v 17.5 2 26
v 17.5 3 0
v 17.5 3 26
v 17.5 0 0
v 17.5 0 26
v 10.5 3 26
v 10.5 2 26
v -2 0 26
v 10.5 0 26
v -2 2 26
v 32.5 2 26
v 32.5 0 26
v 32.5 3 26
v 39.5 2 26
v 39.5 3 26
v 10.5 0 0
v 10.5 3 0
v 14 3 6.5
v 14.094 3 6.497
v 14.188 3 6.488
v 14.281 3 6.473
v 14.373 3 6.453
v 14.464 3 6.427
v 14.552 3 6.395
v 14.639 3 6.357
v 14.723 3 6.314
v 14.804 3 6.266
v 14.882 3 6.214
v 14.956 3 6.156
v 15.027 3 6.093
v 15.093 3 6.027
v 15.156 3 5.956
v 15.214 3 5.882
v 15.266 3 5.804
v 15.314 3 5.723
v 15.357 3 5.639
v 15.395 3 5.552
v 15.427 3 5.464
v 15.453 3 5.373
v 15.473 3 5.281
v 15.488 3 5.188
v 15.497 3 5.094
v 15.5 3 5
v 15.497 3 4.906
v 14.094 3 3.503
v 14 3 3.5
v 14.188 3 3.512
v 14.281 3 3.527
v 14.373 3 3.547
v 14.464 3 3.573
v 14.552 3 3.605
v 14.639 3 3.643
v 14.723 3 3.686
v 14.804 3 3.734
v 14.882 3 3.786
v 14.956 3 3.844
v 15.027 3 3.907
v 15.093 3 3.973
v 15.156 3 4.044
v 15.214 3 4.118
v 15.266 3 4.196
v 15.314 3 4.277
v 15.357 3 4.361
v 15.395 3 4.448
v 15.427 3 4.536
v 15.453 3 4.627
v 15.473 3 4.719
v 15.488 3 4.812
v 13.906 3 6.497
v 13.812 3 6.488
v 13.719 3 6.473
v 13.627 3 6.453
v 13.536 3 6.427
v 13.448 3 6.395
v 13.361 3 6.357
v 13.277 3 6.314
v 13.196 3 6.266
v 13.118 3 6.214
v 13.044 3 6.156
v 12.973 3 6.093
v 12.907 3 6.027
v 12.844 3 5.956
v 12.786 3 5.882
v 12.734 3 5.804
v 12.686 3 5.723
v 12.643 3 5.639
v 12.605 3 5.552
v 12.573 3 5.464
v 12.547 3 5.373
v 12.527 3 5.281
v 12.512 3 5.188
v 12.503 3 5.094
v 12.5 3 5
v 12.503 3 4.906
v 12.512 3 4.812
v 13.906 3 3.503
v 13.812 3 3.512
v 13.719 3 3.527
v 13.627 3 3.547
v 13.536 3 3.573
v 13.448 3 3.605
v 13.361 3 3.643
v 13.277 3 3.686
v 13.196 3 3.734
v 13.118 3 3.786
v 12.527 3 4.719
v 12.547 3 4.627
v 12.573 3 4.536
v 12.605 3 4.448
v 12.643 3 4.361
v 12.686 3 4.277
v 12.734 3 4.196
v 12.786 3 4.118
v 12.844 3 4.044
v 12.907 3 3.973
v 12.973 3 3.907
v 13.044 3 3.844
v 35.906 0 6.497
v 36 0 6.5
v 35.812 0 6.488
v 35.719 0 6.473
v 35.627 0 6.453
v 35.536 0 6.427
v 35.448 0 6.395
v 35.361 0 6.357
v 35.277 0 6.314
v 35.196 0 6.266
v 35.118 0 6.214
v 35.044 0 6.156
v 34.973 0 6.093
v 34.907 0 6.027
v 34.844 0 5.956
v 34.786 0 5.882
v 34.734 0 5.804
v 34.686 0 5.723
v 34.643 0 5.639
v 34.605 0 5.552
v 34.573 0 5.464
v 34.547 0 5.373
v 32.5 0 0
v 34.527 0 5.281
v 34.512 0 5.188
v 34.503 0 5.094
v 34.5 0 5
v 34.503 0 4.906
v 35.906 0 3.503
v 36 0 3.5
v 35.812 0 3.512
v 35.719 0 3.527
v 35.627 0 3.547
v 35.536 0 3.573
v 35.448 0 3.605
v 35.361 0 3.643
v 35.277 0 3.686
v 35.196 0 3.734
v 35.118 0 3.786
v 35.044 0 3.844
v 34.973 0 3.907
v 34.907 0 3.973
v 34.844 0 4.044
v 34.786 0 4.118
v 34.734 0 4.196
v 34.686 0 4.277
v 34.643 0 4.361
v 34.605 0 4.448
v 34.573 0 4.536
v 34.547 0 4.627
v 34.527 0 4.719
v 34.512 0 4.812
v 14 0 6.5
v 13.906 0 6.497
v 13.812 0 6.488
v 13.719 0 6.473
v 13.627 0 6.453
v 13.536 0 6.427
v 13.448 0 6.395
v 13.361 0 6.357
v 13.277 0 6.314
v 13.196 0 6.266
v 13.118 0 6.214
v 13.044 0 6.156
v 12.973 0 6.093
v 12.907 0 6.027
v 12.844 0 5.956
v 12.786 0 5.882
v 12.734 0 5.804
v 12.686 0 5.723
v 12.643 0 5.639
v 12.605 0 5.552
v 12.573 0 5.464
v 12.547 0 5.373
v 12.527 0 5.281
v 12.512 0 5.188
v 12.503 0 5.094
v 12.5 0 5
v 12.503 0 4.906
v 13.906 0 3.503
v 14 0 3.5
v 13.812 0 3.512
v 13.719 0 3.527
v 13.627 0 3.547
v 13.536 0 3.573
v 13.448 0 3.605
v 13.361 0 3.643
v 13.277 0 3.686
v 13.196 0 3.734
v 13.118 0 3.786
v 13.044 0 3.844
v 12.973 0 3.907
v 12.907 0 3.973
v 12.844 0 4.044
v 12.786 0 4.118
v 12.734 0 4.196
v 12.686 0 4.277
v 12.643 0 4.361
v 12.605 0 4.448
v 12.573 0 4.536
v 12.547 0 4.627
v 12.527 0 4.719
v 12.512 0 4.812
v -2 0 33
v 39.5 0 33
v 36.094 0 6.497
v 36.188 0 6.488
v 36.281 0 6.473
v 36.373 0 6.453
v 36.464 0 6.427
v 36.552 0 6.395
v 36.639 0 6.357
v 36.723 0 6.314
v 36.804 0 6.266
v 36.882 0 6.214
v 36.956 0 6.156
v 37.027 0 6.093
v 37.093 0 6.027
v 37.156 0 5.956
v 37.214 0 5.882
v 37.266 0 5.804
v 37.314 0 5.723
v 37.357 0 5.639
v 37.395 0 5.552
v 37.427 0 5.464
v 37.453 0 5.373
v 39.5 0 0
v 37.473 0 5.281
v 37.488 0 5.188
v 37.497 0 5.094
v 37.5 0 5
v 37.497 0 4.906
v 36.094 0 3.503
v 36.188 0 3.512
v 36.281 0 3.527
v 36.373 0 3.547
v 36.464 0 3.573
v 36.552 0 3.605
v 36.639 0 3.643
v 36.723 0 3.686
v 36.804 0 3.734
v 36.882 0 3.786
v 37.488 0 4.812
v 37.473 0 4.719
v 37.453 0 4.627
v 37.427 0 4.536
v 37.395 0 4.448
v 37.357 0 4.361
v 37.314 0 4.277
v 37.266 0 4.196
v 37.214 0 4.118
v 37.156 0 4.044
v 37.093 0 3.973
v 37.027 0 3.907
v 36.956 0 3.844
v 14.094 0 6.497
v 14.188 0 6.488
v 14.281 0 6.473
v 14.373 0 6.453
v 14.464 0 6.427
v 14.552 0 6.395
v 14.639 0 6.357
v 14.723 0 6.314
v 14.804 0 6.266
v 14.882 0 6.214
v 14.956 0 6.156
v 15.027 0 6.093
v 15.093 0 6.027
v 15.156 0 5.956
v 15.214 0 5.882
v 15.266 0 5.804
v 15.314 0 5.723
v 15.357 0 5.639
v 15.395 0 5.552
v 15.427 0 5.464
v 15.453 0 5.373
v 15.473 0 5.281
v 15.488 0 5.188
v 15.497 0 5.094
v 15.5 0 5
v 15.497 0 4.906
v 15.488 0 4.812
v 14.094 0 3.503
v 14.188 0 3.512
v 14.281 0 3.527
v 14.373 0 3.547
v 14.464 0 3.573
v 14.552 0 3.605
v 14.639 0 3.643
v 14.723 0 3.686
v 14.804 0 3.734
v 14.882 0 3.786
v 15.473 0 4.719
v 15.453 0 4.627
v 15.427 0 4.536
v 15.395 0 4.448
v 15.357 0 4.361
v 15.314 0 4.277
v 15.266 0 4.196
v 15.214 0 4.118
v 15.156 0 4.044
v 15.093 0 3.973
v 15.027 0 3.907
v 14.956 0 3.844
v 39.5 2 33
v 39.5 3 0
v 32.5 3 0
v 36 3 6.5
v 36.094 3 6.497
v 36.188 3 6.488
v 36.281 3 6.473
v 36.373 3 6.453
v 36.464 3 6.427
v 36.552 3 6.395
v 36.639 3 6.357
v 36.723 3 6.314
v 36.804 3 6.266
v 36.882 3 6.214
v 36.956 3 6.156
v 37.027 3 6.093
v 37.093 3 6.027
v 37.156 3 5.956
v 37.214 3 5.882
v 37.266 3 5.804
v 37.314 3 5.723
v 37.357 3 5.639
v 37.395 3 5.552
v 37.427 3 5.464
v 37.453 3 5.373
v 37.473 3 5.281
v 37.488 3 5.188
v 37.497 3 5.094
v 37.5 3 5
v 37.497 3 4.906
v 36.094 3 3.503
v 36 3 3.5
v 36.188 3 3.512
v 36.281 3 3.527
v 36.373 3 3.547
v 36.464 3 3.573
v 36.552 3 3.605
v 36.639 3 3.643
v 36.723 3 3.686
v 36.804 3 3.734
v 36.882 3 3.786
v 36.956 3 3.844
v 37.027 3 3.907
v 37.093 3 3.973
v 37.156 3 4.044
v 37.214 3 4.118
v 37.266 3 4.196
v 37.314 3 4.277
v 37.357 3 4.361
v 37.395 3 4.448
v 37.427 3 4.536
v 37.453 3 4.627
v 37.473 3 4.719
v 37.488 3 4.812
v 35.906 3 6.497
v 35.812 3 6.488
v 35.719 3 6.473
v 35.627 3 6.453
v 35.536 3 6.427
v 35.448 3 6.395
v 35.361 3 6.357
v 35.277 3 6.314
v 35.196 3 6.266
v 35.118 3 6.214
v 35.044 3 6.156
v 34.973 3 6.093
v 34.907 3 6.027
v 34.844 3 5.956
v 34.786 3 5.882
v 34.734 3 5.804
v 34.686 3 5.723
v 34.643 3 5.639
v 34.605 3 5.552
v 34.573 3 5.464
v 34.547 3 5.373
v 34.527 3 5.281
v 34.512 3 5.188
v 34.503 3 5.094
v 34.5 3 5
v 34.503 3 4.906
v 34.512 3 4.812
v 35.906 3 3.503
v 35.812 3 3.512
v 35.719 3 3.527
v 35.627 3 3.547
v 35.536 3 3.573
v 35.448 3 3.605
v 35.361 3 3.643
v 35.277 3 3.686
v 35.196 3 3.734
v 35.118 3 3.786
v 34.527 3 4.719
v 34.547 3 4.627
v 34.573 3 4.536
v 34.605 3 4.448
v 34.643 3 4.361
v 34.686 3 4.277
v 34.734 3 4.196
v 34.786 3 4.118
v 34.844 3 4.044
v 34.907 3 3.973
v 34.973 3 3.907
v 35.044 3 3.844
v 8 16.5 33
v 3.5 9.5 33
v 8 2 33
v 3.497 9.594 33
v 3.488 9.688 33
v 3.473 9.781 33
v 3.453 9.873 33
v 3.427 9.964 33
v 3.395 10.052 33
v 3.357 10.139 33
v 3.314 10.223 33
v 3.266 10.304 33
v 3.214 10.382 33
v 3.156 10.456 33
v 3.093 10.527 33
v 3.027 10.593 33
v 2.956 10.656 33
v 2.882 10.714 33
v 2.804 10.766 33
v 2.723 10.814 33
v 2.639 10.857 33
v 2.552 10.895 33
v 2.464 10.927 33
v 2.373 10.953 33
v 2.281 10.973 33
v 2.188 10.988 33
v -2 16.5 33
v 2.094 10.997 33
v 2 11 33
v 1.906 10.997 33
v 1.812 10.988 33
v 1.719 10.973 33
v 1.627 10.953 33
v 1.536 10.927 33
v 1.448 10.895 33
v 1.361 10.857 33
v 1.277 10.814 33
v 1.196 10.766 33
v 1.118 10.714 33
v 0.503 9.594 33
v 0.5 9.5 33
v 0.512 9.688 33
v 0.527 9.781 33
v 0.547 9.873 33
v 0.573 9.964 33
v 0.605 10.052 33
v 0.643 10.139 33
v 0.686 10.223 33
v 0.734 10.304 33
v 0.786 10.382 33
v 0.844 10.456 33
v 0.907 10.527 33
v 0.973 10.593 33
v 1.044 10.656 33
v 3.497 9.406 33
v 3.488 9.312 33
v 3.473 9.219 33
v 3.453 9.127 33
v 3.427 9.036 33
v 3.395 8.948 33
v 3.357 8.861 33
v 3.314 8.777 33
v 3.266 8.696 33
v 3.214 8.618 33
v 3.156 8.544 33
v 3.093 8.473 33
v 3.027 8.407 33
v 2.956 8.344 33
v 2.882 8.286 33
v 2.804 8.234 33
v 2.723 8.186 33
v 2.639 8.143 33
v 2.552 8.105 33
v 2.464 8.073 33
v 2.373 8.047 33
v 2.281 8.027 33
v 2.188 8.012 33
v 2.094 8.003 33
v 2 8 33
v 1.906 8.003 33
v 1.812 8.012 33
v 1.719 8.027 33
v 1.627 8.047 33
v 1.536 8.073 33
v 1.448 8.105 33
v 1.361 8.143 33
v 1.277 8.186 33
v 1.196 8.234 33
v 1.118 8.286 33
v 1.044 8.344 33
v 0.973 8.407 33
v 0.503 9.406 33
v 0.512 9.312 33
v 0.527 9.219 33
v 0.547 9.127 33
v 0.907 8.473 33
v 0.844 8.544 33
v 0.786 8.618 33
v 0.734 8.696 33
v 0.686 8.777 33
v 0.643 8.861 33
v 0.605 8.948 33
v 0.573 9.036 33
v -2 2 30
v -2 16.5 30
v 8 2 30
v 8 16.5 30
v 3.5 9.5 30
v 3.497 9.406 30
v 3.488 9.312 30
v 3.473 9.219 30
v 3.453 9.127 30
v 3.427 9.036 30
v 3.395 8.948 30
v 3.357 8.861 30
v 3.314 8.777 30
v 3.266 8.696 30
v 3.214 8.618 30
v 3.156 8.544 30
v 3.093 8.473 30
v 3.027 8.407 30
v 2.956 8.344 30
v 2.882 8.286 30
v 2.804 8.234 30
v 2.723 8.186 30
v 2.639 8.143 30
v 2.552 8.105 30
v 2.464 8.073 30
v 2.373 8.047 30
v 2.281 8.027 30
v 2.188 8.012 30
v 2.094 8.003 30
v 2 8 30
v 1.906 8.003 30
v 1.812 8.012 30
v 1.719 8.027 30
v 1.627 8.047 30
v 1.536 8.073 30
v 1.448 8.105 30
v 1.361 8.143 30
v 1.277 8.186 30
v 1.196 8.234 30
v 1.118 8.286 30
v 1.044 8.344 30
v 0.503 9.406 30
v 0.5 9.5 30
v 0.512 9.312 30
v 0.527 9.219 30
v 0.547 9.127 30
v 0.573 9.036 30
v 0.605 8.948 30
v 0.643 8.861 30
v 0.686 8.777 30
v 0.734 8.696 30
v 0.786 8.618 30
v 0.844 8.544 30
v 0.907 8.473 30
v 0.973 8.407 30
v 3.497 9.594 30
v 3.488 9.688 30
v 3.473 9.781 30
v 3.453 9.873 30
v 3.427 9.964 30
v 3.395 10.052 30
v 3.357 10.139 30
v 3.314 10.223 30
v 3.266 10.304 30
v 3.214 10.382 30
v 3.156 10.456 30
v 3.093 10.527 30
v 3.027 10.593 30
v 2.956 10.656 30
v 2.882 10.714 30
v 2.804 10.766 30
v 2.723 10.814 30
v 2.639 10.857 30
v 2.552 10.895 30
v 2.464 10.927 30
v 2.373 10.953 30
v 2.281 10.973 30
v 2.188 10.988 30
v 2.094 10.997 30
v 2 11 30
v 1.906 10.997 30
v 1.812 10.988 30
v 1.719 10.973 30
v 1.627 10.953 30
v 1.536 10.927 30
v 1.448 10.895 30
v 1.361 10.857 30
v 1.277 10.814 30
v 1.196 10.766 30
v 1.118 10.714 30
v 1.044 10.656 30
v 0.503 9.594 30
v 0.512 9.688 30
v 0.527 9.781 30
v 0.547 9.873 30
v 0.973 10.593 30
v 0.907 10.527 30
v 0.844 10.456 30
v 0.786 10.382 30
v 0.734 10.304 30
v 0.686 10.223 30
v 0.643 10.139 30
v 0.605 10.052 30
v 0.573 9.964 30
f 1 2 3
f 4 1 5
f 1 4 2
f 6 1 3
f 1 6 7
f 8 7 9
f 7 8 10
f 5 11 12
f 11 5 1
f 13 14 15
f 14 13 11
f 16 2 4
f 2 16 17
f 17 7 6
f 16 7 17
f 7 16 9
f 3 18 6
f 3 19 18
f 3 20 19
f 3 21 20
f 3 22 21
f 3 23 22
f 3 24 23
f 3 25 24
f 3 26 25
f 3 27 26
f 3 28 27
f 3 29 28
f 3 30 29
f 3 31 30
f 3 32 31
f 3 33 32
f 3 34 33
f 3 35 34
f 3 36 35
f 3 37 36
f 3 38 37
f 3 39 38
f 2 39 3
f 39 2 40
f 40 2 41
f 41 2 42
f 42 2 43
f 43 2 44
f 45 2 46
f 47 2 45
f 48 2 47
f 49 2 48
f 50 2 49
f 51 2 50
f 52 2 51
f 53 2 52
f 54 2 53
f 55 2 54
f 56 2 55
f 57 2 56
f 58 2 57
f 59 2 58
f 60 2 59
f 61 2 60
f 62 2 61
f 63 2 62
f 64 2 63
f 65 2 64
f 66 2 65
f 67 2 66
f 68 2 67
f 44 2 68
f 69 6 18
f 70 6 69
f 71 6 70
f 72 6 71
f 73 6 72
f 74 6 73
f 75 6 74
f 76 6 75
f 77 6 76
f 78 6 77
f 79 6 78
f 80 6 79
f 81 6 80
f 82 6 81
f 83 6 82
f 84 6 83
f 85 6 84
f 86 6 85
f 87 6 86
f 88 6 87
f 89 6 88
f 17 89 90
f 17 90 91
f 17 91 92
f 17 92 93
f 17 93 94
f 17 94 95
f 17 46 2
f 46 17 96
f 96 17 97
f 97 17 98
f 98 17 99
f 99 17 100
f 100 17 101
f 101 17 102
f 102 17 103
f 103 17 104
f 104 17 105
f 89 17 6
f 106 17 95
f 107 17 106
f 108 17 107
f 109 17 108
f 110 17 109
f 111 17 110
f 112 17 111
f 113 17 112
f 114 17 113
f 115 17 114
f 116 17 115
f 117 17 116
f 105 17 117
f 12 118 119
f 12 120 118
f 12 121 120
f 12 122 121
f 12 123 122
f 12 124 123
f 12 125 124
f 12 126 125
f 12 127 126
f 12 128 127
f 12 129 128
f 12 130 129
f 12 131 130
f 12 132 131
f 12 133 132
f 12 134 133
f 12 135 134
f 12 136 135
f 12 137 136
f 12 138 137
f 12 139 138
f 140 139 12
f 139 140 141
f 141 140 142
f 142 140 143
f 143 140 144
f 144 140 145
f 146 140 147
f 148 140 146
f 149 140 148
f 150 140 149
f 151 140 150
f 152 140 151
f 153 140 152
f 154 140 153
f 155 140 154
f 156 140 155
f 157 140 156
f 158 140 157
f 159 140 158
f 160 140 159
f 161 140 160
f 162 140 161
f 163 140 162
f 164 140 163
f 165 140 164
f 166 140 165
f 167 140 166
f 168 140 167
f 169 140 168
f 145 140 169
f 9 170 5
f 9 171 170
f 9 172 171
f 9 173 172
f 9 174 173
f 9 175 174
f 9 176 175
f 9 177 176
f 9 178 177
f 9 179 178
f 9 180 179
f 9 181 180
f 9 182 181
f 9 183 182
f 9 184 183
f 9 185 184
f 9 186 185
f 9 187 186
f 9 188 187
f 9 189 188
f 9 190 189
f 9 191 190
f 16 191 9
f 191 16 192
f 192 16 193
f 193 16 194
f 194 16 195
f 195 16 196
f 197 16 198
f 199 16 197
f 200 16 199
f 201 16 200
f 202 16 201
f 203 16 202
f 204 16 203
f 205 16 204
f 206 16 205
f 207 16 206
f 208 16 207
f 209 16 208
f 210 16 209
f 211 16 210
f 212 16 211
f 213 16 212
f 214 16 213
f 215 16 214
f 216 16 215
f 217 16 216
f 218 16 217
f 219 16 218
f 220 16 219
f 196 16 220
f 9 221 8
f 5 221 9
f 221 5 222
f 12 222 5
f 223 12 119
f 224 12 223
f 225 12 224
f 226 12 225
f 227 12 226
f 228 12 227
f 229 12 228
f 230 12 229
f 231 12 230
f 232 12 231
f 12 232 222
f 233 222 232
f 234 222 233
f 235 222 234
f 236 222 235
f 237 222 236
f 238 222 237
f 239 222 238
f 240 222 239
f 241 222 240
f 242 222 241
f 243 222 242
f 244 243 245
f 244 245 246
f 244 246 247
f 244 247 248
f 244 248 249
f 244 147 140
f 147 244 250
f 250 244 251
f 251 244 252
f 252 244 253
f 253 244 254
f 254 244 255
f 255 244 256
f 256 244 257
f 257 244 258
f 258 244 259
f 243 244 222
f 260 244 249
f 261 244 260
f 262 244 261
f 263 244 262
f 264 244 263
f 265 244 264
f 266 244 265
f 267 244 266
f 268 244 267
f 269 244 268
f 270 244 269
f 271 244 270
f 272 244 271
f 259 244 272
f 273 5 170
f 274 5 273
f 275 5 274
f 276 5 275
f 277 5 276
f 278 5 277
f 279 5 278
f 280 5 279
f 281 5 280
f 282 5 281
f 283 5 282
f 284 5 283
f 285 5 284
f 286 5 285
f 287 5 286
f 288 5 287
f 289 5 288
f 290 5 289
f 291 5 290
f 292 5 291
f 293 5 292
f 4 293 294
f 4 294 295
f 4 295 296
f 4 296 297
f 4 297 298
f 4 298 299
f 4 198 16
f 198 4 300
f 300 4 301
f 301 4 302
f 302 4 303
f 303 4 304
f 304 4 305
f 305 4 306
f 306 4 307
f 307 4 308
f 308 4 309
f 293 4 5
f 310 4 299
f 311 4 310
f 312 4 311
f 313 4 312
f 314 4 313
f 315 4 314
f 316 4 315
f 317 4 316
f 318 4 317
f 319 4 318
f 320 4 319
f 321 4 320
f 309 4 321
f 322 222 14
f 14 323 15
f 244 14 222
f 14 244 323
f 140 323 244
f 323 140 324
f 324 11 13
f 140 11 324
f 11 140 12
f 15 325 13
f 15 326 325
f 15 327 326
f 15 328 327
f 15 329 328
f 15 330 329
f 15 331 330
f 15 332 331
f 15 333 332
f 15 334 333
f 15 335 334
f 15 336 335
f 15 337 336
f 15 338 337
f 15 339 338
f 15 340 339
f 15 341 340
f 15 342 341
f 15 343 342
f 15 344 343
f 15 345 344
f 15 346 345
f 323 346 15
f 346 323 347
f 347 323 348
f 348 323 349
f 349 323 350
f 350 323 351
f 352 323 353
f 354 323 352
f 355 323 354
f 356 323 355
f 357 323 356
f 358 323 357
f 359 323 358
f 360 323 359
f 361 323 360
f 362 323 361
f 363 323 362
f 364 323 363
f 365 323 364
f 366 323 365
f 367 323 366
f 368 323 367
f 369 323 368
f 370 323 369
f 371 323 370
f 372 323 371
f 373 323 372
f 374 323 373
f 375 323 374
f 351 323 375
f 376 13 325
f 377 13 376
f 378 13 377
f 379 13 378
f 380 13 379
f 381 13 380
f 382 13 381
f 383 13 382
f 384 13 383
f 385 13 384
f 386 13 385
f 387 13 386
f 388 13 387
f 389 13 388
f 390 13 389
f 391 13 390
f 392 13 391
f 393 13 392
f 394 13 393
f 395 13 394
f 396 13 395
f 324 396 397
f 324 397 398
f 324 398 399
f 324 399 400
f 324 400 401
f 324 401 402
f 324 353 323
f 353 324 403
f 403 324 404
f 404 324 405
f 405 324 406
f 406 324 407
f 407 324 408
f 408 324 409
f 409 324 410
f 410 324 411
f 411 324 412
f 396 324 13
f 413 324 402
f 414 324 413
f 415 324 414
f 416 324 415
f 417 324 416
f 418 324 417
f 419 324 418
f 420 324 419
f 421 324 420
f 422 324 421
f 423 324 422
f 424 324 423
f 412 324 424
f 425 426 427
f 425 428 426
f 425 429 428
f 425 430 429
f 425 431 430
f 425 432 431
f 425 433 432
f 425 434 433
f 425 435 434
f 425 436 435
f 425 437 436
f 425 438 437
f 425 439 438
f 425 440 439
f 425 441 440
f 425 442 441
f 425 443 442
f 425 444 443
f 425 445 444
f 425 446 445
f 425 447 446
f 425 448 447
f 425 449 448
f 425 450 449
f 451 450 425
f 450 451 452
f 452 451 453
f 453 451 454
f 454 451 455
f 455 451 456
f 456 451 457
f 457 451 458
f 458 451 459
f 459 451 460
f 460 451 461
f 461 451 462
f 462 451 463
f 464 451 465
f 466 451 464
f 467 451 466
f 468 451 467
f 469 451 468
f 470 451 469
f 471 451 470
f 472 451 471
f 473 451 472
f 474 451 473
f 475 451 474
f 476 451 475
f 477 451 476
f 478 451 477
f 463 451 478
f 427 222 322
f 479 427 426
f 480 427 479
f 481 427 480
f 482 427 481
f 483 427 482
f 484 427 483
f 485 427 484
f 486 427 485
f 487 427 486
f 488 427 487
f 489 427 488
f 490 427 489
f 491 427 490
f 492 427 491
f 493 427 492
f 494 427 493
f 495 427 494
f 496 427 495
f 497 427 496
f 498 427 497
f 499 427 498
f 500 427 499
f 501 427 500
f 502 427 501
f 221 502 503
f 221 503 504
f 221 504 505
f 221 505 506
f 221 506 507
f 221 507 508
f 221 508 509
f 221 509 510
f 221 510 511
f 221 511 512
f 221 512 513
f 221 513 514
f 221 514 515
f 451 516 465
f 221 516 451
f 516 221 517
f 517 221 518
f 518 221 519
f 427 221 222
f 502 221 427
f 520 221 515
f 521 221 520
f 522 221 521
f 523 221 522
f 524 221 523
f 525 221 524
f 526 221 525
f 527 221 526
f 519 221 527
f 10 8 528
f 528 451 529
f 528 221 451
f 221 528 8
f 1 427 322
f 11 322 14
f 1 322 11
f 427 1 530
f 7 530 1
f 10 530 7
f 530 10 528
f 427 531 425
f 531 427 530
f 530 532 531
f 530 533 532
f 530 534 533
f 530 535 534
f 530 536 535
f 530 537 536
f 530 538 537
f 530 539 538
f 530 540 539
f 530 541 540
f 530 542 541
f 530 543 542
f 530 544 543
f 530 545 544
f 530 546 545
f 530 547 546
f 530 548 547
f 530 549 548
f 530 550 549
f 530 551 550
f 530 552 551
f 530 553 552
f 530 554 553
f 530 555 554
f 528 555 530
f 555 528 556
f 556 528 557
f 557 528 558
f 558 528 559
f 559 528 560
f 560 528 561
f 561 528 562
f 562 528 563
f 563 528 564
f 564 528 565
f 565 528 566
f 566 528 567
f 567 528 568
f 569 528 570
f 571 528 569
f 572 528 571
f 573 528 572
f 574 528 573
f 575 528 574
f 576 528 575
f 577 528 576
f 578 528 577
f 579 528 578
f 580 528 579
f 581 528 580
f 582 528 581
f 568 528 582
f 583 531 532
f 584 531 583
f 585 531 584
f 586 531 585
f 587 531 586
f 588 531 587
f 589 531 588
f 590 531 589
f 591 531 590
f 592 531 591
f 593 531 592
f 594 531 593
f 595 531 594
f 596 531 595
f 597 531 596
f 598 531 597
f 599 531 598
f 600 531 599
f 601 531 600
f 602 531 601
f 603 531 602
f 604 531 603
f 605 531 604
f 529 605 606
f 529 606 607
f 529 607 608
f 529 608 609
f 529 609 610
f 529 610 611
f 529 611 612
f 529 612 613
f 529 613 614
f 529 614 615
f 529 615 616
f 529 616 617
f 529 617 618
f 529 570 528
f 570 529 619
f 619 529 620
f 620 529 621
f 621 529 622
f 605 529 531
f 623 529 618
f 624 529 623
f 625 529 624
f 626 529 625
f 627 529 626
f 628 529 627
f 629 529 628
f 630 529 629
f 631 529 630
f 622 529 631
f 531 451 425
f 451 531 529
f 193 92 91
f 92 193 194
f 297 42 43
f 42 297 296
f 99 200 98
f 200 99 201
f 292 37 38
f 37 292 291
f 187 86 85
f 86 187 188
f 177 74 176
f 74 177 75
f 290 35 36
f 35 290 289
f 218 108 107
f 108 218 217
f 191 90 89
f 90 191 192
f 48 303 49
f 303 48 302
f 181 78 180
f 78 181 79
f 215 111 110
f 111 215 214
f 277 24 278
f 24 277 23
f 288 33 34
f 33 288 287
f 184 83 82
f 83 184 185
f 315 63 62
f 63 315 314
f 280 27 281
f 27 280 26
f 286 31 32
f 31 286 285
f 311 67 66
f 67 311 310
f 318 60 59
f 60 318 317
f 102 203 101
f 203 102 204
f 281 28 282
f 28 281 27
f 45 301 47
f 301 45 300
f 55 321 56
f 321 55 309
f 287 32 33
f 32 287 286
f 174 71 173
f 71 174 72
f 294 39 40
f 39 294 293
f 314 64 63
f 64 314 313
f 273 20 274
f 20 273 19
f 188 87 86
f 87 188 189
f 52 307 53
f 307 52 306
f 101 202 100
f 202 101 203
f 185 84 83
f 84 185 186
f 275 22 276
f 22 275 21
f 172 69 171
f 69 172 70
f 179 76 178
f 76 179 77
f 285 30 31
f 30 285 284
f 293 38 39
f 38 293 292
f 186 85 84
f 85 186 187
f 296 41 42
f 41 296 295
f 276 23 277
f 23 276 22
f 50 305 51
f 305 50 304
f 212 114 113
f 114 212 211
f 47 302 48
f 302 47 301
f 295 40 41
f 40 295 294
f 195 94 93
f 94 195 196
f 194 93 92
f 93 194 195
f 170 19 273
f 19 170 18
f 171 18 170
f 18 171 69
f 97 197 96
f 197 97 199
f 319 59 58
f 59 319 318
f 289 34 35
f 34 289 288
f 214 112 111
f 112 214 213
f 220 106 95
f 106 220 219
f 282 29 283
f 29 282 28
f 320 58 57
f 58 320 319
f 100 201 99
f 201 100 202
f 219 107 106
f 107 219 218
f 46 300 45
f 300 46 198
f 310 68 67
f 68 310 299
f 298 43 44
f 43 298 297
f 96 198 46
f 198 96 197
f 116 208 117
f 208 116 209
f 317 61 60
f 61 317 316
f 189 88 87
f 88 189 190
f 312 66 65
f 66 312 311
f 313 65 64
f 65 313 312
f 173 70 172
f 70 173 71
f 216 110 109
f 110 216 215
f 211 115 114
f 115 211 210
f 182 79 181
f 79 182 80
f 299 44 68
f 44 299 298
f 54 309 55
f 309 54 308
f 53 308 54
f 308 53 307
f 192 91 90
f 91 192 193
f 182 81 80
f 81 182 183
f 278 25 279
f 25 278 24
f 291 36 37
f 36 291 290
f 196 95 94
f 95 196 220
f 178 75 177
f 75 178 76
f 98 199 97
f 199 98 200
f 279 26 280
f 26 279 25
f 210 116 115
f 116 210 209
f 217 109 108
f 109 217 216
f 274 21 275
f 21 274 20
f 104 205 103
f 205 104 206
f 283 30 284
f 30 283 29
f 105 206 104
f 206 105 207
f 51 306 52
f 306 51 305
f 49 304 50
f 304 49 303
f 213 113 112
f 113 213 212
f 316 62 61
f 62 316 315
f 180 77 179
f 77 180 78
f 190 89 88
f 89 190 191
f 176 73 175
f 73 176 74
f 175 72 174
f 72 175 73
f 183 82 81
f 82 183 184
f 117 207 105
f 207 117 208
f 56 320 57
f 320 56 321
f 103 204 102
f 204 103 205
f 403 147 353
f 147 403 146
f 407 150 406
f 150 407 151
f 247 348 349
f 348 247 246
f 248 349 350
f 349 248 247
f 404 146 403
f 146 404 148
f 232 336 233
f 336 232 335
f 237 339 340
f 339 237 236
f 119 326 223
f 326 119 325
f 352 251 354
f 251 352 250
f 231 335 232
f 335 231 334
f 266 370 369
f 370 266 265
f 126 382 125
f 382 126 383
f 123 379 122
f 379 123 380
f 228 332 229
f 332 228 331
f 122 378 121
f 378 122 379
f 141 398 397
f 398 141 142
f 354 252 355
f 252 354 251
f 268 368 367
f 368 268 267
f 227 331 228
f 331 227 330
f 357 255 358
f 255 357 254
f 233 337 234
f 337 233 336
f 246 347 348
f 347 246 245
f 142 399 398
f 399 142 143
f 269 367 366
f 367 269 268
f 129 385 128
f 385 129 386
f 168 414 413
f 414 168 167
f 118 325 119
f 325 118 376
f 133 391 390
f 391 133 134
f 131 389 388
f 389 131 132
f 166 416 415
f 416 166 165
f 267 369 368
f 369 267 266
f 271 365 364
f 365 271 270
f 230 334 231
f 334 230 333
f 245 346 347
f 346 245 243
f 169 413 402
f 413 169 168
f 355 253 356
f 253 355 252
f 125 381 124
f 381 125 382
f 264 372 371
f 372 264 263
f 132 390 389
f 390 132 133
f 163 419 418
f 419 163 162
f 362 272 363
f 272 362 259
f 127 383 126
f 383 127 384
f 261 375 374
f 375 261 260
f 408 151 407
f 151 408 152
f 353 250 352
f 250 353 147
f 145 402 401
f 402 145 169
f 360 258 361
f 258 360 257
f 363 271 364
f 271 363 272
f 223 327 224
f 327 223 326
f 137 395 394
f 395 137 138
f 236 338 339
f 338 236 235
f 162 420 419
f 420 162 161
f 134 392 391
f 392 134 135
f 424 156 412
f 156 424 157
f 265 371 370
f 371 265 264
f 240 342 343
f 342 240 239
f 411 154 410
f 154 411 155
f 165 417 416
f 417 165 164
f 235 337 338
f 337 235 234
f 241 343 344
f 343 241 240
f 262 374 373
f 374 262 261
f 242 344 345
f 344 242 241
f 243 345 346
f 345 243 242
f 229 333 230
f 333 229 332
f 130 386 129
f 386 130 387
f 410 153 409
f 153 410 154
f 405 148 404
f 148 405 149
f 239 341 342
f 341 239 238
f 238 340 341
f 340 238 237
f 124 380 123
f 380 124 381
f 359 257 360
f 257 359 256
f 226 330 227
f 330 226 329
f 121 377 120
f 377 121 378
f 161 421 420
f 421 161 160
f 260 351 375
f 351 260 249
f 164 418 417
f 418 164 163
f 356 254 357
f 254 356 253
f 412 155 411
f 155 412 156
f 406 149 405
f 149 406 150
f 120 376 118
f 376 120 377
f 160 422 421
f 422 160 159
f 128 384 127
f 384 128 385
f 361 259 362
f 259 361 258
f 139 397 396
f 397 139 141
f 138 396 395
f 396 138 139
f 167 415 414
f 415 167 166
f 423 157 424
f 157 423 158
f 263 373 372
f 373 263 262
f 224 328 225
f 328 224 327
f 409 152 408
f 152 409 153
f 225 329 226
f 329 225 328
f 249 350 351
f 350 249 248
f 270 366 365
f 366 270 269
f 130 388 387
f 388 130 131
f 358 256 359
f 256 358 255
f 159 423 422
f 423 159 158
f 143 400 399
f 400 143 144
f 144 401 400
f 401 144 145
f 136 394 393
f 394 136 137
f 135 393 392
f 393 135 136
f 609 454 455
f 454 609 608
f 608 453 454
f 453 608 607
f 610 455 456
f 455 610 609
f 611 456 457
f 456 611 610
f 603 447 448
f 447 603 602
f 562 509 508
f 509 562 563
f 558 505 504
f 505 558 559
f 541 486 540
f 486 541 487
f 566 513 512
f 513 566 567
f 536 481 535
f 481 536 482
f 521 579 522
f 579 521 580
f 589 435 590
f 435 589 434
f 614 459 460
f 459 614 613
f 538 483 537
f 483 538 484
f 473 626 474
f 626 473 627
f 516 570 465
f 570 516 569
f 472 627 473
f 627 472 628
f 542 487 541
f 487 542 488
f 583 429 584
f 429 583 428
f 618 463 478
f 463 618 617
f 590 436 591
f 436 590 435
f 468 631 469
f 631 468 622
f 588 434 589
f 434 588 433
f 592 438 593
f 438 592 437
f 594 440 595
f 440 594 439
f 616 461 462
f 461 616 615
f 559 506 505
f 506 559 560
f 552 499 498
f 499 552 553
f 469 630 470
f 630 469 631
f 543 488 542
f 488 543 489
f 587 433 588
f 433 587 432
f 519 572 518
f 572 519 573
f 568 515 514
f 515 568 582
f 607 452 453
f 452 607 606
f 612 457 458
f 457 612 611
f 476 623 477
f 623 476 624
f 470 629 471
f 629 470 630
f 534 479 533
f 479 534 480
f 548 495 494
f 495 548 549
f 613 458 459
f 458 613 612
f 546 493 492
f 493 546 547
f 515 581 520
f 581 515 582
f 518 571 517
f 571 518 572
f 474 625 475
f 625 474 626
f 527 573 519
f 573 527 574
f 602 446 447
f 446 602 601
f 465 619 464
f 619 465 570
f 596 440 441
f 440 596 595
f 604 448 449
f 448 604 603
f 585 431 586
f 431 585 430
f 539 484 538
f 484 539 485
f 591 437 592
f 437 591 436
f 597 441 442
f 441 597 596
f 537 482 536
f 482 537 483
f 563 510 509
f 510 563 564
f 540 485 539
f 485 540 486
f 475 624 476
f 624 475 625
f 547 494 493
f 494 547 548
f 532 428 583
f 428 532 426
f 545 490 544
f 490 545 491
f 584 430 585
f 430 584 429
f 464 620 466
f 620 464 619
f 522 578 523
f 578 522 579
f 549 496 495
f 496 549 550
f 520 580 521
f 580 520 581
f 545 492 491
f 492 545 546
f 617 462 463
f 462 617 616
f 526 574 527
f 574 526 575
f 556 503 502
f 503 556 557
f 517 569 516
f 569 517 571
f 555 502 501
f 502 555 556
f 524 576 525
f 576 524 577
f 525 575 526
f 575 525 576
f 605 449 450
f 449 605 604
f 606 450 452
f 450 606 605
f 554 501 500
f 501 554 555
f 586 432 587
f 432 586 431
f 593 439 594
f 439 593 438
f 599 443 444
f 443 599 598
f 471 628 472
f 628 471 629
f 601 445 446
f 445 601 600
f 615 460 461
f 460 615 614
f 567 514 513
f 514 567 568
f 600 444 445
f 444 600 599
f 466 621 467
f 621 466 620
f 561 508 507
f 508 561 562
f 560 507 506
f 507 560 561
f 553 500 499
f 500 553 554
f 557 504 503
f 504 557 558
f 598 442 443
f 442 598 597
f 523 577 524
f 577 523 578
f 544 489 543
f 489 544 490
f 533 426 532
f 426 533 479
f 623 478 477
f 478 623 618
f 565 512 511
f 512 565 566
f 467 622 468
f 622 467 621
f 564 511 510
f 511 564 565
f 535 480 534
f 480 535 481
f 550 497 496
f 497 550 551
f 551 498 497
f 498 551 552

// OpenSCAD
difference(){
	union(){
        

        translate([10.5,0,0]){
            cube([7,3,31-5], center=false);
        }         
        translate([32.5,0,0]){
            cube([7,3,31-5], center=false);
        }         
        translate([-2,0,31-5]){
            cube([41.5,2,7], center=false);
        }         
        translate([-2,0,35-5]){
            cube([10,16.5,3], center=false);
        }         
   
        
   

	}
	union() {
        translate([14,30,5]){
            rotate([90,0,0]){
                cylinder(h=99, r=1.5, $fn=100, center=false);
            }
        }       
        translate([36,30,5]){
            rotate([90,0,0]){
                cylinder(h=99, r=1.5, $fn=100, center=false);
            }
        }       
        translate([2,9.5,0]){
            rotate([0,0,90]){
                cylinder(h=99, r=1.5, $fn=100, center=false);
            }
        }       

  

	}
}
